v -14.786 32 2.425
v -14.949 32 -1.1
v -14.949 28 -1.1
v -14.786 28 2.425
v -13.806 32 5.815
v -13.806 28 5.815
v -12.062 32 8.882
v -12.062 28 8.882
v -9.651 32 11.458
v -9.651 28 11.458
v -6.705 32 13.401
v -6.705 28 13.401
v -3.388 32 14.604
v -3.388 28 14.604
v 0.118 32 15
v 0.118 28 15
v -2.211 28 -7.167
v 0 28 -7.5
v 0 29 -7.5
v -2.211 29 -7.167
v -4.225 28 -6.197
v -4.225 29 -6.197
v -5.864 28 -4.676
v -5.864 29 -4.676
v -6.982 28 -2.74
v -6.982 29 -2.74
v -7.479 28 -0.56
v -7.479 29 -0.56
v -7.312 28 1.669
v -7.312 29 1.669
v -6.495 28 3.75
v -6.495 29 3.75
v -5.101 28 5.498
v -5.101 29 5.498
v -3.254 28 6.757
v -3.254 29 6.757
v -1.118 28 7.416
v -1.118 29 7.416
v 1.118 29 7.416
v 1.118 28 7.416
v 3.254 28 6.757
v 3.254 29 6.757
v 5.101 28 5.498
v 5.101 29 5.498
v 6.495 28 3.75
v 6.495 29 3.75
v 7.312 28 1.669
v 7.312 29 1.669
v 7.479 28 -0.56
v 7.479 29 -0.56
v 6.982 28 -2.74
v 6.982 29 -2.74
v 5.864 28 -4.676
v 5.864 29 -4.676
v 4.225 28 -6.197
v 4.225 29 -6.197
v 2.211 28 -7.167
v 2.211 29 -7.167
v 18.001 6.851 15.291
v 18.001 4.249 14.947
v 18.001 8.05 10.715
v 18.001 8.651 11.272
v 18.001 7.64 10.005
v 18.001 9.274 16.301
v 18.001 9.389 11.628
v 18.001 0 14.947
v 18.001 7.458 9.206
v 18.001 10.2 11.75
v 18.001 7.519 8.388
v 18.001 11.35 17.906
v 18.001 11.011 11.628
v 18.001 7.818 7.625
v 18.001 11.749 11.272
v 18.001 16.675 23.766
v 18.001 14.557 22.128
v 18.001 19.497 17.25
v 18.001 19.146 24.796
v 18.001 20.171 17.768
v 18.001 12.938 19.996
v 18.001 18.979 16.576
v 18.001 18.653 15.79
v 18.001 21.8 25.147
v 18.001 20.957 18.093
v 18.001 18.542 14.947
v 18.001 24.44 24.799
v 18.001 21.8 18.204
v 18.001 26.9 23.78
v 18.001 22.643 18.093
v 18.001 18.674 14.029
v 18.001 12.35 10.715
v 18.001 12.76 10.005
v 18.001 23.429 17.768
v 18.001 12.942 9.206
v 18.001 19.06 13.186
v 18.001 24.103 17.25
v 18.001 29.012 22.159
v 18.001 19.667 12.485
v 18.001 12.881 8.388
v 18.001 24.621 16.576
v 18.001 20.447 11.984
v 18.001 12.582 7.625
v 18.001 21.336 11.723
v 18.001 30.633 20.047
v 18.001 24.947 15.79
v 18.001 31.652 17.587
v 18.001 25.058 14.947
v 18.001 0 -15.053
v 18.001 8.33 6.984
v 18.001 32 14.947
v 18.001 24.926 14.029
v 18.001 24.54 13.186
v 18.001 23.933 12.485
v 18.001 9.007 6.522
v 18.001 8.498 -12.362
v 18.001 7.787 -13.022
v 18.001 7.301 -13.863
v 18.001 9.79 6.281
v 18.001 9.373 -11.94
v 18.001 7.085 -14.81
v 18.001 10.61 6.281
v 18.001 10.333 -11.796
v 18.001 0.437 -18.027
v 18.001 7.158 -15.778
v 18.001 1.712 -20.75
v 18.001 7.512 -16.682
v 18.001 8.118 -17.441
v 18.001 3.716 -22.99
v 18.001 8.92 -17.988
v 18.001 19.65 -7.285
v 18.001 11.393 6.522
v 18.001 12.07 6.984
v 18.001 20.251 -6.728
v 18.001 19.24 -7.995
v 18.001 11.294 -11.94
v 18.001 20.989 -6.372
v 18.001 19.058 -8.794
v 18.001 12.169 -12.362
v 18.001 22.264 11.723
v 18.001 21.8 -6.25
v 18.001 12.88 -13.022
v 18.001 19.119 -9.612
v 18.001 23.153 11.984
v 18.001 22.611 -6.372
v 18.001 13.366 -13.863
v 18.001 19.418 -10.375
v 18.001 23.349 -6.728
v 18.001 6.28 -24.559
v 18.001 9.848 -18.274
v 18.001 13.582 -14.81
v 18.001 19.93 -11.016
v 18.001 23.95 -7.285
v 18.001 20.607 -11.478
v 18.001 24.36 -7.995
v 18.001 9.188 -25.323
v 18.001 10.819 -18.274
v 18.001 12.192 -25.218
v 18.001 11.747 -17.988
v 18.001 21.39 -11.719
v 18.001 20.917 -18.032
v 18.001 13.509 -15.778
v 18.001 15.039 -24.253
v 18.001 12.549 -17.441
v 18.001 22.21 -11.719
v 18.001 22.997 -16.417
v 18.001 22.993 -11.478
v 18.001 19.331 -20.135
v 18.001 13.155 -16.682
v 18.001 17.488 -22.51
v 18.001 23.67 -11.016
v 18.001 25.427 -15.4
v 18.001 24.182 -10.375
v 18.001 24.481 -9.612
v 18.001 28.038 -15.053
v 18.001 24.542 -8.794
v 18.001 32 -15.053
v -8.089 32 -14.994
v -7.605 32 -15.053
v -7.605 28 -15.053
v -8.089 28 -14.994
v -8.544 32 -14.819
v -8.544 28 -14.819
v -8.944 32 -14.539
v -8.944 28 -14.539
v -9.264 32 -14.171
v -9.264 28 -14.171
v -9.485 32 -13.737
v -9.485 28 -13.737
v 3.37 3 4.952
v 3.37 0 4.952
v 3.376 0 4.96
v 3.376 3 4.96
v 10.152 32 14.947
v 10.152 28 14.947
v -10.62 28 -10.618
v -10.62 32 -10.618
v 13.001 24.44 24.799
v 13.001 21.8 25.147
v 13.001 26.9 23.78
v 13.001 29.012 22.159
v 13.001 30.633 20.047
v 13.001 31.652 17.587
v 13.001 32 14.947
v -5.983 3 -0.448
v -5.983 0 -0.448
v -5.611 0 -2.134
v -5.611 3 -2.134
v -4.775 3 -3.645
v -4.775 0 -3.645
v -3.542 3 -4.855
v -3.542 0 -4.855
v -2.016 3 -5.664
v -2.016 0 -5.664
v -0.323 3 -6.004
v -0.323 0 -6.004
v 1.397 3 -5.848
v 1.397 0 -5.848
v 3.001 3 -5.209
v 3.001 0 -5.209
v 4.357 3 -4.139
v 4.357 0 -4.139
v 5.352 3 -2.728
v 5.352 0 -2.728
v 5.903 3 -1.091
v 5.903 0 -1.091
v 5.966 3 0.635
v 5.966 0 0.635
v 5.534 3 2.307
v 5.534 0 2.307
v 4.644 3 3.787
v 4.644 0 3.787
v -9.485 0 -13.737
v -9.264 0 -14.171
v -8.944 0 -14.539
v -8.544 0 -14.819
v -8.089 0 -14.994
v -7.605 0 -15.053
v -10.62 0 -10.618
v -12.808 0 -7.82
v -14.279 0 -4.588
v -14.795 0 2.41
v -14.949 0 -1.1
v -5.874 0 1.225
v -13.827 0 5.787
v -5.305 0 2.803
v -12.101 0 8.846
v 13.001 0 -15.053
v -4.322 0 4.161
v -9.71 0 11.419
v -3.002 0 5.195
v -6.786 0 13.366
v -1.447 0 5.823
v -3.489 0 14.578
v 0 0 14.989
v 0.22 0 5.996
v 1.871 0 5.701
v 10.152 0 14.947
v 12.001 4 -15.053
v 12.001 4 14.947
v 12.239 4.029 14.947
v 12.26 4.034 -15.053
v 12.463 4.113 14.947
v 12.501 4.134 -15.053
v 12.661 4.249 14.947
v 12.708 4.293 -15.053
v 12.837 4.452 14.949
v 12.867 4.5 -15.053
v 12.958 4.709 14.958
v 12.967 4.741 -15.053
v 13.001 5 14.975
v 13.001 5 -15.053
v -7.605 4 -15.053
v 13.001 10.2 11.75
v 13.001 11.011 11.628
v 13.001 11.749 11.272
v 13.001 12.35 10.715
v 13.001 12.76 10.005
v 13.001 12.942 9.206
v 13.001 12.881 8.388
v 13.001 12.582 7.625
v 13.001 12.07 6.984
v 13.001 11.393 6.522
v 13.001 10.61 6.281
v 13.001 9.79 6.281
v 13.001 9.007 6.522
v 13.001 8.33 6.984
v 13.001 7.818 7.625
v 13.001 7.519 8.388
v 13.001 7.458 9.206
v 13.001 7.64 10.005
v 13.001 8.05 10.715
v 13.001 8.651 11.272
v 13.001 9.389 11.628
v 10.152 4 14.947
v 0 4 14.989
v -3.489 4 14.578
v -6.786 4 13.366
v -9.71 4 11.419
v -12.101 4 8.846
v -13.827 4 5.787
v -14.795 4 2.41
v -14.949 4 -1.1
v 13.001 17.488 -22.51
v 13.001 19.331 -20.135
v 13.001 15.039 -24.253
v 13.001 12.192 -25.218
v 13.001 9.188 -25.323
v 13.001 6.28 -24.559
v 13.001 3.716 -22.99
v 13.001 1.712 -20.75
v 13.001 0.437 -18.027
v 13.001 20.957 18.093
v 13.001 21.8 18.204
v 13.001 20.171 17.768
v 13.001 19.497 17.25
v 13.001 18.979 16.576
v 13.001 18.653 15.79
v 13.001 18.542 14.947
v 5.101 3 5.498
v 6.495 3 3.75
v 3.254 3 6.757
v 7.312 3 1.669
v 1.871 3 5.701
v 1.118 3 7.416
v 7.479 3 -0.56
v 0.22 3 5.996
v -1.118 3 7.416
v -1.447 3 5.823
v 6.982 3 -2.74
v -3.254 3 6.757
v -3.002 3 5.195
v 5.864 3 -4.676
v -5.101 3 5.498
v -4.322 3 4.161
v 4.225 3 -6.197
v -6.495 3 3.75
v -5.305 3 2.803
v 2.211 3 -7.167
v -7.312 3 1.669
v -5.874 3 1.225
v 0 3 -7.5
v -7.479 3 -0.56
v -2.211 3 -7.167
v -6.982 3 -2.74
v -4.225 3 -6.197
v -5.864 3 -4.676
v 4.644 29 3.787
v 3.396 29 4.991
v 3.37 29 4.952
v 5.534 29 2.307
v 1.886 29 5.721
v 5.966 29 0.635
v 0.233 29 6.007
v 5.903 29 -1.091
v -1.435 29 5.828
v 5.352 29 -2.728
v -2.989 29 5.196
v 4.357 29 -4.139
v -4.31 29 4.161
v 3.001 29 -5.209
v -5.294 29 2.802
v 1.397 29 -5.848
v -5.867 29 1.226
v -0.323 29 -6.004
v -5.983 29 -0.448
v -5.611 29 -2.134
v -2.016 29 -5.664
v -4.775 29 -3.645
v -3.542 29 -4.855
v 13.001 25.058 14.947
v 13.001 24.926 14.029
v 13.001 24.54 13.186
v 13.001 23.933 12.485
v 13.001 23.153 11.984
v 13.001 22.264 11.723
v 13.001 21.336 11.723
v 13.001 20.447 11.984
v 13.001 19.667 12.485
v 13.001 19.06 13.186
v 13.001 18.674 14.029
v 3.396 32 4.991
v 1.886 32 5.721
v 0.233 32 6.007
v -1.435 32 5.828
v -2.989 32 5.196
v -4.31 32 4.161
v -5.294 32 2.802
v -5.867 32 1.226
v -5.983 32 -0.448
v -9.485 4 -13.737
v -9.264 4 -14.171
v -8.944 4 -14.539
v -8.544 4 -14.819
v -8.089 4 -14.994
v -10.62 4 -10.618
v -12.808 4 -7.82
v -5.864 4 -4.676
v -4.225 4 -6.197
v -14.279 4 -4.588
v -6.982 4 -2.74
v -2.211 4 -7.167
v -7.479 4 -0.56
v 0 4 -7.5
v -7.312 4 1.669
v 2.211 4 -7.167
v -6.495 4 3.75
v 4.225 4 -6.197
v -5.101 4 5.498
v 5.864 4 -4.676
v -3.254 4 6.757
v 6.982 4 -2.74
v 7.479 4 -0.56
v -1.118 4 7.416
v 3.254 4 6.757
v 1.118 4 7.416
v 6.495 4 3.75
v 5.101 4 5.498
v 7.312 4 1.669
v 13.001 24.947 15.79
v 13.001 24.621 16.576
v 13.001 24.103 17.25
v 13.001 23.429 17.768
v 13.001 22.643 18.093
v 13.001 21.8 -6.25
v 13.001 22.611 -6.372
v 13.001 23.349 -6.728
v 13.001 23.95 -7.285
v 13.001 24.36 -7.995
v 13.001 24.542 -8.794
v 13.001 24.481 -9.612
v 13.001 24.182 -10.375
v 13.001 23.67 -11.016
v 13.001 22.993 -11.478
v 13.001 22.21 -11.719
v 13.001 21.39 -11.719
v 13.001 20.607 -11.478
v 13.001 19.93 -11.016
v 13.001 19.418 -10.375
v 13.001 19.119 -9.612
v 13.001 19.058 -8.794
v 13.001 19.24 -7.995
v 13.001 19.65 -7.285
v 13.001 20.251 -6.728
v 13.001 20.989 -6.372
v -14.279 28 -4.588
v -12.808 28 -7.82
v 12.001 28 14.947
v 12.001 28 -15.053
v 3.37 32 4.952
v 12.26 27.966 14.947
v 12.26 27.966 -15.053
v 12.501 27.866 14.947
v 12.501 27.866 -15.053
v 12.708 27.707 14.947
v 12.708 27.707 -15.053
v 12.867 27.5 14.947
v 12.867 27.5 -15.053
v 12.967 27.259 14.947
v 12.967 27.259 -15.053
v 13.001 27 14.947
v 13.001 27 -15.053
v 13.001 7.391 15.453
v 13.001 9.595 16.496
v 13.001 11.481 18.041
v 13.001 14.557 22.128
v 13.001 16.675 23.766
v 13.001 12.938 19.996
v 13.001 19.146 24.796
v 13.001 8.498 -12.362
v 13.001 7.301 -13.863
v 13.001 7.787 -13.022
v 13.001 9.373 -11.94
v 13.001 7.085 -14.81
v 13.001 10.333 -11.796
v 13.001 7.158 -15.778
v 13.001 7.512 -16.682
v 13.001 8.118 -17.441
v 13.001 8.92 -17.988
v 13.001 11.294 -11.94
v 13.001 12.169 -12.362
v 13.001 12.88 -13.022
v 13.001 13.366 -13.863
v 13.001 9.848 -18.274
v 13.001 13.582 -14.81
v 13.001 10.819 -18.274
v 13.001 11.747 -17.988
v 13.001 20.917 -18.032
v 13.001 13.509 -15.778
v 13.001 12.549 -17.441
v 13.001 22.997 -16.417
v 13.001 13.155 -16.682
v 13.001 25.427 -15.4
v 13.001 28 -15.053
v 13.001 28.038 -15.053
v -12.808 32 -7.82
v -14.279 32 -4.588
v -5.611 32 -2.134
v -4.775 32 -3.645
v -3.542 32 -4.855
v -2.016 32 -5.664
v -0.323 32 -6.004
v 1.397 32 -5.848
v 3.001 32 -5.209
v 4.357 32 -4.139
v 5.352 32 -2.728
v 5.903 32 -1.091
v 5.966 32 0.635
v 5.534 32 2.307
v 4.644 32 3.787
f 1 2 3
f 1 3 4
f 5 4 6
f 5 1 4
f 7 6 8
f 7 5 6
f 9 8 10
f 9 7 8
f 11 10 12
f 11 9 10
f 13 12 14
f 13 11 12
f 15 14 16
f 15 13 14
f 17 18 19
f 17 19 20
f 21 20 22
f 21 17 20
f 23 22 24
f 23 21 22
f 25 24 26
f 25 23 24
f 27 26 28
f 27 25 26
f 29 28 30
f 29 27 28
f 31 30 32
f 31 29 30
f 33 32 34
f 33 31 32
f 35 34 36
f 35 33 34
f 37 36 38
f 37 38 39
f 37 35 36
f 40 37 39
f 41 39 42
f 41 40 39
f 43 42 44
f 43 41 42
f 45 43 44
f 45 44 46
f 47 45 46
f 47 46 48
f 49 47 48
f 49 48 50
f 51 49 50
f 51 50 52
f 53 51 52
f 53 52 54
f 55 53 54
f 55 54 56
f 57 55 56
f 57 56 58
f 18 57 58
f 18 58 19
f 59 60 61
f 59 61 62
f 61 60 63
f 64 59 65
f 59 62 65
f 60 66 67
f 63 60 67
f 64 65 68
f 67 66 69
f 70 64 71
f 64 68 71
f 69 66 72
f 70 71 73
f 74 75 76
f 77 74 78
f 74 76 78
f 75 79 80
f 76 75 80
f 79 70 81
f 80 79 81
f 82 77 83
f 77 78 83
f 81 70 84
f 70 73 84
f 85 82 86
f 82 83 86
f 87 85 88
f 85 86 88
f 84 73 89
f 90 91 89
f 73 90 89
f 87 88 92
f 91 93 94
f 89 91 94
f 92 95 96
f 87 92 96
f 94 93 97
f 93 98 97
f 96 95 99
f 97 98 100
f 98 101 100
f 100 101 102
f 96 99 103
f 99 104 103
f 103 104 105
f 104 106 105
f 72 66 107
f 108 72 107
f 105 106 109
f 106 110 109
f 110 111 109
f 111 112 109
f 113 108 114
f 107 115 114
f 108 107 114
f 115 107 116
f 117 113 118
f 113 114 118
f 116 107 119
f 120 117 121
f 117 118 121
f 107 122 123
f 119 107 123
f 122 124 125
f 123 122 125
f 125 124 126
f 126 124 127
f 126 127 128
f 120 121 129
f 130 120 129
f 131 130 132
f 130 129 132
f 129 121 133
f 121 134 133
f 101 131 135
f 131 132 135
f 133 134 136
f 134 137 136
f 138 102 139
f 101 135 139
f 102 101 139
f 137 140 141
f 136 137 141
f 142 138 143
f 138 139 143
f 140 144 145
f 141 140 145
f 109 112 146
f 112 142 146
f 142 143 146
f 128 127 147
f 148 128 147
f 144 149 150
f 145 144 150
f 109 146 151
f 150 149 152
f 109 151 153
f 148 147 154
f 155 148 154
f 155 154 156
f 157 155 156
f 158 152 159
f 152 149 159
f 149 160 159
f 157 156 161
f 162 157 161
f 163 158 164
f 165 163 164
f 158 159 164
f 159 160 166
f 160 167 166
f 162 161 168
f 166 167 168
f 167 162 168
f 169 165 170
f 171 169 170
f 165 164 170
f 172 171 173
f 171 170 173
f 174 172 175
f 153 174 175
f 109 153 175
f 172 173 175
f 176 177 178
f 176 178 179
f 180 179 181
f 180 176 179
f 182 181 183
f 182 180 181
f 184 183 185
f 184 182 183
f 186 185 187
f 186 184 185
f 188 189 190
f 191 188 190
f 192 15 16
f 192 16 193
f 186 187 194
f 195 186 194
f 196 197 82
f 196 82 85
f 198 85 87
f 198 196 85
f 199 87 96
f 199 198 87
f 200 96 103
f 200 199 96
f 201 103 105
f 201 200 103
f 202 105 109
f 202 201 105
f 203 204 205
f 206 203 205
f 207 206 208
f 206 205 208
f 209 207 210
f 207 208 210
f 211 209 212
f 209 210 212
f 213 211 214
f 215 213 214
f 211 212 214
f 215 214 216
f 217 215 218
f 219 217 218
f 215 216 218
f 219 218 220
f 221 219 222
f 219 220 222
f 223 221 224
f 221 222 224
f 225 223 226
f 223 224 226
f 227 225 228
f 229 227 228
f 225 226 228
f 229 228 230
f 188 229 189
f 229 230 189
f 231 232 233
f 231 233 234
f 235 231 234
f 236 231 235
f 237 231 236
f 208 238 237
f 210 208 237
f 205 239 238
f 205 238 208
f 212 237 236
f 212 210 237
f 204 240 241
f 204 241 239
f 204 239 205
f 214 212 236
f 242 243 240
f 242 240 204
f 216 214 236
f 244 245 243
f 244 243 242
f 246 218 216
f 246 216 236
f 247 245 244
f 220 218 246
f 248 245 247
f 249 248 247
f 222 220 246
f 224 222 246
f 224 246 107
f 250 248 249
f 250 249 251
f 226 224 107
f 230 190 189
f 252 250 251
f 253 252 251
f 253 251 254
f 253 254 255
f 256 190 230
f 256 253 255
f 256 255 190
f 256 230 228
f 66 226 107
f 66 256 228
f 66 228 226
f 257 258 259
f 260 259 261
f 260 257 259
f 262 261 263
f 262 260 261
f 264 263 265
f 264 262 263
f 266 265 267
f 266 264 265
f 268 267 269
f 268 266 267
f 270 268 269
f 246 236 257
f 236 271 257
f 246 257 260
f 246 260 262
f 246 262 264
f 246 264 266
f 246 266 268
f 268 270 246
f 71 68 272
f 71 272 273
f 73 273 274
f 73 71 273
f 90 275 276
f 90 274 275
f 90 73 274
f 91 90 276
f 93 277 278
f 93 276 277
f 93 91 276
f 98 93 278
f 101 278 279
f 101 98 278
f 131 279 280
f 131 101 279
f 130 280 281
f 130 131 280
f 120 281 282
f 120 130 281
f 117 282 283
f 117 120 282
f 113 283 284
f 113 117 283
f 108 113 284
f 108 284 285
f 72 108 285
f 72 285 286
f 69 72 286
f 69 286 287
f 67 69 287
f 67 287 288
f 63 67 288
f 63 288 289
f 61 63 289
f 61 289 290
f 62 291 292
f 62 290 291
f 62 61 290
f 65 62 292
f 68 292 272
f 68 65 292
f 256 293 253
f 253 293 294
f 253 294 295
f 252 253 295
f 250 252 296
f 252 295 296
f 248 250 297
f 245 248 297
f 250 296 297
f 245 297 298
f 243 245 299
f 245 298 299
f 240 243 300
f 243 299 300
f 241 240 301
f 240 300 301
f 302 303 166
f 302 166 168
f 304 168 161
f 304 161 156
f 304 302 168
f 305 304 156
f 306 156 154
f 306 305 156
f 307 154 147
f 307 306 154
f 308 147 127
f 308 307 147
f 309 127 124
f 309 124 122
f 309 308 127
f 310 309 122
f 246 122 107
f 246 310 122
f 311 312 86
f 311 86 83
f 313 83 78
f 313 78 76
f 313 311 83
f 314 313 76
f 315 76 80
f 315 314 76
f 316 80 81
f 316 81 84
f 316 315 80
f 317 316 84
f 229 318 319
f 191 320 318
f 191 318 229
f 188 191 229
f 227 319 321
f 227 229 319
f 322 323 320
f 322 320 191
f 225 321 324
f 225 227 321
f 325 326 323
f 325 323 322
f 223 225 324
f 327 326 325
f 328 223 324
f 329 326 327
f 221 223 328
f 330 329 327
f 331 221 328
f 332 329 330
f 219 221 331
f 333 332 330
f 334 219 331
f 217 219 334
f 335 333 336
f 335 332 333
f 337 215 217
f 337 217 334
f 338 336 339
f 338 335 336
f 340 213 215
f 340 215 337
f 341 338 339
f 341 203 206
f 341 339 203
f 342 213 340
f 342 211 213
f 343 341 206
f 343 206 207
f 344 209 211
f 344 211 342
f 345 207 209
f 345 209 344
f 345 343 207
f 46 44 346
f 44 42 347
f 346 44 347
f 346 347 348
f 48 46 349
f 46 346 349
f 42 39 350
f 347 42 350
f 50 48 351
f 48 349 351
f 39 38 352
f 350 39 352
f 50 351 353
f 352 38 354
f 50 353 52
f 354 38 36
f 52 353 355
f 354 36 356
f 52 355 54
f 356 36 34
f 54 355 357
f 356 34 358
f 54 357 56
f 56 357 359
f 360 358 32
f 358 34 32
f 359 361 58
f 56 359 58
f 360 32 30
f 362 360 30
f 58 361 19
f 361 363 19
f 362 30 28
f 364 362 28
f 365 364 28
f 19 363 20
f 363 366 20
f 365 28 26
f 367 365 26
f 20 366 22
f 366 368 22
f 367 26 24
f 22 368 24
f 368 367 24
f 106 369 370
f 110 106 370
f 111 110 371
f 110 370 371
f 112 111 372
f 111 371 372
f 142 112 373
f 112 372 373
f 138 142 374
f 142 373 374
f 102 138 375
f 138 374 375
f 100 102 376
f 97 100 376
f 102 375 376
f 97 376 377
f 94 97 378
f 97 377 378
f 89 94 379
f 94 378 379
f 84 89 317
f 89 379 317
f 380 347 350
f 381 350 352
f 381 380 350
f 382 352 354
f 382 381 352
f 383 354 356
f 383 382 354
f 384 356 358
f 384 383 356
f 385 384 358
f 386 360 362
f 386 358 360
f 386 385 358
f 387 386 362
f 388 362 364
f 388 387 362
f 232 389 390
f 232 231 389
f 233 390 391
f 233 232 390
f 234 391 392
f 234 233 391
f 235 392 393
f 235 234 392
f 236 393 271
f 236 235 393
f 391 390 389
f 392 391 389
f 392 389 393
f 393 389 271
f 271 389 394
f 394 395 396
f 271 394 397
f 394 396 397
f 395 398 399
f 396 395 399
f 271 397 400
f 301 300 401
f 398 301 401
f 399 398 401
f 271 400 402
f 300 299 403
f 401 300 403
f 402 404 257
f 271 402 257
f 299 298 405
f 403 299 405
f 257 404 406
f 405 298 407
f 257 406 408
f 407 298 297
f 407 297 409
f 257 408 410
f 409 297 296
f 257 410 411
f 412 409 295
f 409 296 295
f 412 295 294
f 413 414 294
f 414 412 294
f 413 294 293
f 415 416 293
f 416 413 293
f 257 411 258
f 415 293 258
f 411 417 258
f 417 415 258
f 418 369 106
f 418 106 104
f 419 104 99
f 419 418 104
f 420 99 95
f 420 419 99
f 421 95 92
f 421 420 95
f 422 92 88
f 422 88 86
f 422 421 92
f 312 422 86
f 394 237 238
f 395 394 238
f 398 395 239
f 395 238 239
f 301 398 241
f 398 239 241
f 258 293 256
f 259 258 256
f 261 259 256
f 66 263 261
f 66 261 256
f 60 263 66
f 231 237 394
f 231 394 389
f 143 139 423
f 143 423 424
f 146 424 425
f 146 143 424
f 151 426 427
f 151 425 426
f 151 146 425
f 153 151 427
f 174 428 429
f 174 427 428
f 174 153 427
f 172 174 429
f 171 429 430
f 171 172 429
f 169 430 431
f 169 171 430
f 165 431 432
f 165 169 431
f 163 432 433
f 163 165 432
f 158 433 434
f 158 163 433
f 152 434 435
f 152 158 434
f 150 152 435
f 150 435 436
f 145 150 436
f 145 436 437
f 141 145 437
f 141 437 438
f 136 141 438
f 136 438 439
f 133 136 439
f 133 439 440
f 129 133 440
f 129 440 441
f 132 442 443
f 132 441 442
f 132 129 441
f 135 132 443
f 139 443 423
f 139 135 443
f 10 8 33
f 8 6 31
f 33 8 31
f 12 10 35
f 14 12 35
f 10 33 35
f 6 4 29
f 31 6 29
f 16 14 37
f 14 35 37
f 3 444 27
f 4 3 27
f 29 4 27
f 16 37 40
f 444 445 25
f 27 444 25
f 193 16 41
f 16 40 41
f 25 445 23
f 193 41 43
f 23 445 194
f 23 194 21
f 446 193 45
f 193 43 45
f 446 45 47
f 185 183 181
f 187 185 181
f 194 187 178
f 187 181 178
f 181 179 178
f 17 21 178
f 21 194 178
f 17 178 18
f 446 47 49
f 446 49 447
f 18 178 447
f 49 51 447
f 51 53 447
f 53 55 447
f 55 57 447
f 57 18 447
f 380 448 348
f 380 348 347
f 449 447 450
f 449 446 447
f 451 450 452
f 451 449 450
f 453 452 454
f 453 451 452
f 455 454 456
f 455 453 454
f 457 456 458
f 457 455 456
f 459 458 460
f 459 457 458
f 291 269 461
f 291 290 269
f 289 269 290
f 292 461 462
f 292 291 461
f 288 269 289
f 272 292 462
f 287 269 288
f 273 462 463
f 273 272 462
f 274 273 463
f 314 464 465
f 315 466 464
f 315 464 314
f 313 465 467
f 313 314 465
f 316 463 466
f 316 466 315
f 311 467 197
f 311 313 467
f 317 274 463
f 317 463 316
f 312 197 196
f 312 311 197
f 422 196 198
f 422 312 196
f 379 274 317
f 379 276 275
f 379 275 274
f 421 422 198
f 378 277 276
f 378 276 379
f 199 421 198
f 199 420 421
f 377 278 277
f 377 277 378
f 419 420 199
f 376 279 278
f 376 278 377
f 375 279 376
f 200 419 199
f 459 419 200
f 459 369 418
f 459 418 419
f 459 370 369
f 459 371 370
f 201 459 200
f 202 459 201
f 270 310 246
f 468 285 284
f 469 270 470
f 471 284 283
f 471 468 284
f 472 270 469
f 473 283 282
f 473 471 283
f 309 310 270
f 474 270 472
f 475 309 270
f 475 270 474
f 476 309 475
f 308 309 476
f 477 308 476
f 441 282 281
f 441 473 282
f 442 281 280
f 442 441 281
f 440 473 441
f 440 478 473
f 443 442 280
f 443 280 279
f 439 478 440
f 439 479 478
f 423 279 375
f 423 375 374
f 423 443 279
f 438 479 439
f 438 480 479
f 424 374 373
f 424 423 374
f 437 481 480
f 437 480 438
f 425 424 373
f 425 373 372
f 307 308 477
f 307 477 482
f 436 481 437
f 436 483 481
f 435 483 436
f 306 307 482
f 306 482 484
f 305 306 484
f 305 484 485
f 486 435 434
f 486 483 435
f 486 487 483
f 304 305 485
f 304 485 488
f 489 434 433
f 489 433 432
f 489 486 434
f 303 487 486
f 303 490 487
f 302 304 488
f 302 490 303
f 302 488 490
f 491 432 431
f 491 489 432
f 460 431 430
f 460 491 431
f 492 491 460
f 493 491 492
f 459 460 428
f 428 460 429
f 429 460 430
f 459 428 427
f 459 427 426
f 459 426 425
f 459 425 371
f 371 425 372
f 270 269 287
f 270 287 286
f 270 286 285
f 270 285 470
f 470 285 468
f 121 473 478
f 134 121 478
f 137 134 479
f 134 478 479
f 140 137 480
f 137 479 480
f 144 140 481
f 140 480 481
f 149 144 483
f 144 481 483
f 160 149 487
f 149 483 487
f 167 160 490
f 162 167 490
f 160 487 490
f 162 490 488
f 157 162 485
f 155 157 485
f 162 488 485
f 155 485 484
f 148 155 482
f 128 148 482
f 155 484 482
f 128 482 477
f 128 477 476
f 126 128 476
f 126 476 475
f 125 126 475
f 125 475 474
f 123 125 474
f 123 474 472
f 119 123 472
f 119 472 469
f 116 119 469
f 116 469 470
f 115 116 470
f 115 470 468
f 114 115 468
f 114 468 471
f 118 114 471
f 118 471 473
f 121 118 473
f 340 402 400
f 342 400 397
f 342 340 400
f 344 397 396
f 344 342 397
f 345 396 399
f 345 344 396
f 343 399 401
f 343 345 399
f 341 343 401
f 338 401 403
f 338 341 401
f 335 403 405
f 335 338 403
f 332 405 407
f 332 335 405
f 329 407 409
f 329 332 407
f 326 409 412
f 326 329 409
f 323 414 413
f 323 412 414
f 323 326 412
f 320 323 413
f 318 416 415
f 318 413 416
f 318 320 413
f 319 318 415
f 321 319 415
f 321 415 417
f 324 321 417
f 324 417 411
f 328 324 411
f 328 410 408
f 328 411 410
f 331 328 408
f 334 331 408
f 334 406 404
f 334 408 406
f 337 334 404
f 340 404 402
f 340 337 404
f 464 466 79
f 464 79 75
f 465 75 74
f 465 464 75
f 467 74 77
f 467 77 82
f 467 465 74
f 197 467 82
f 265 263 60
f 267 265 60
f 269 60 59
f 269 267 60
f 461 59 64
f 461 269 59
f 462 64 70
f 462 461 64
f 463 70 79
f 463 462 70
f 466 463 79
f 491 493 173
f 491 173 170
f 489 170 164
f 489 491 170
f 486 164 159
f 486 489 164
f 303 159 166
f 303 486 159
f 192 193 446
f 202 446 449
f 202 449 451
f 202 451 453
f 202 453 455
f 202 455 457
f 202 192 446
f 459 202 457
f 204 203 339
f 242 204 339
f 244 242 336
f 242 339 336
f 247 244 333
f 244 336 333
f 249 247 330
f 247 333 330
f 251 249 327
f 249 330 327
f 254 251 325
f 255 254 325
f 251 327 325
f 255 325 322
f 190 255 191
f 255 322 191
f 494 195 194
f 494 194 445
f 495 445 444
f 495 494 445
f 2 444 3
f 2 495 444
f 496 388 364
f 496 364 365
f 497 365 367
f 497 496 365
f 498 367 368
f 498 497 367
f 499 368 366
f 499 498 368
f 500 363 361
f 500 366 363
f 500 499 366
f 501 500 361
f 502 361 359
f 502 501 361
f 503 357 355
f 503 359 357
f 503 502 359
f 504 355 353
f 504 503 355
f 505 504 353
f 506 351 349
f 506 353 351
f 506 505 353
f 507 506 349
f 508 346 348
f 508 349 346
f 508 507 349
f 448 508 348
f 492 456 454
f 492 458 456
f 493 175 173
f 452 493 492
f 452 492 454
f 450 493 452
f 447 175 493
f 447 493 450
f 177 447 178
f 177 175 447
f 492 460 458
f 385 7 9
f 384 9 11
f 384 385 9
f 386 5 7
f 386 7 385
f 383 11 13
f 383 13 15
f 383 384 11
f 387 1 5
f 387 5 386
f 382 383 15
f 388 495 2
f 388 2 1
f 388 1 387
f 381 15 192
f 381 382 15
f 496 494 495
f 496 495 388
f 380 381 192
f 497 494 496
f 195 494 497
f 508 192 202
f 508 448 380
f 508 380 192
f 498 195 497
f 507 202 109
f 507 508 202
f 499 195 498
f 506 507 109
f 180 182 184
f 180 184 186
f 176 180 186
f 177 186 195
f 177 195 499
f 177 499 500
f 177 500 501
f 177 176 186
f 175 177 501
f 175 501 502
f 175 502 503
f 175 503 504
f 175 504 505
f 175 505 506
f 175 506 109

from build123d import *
from build123d.topology import SkipClean

# Parameters (mm, degrees)
BOSS_EXTRUDE1_DEPTH     = 4
SKETCH3_W               = 5
SKETCH3_H               = 30
BOSS_EXTRUDE3_DEPTH     = 24
BOSS_EXTRUDE5_DEPTH     = 5
SKETCH7_3_R             = 3.25755
CUT_EXTRUDE3_DEPTH      = 5
FILLET3_R               = 10
BOSS_EXTRUDE8_START     = -4
BOSS_EXTRUDE8_DEPTH     = 4
BOSS_EXTRUDE9_DEPTH     = 4
CUT_EXTRUDE4_DEPTH      = 25
CUT_EXTRUDE4_DEPTH_BACK = 1
SKETCH8_R               = 7.5
CUT_EXTRUDE5_DEPTH      = 50.517048882
CUT_EXTRUDE5_DEPTH_BACK = 50.517048882
SKETCH9_R               = 2.75
FILLET4_R               = 1
BOSS_EXTRUDE6_START     = -4
BOSS_EXTRUDE6_DEPTH     = 4
FILLET6_R               = 2
BOSS_EXTRUDE7_DEPTH     = 4


# Read off the part's stored shape, not the designer's step: Boss-Extrude8
with BuildPart() as part:
    # Sketch2 → Boss-Extrude1 (new body)
    with BuildSketch(Plane(origin=(0, 0, 0), x_dir=(1, 0, 0), z_dir=(0, 1, 0))):
        with BuildLine():
            Line((18.000912404, -14.946929254), (18.000912404, 15.053070746))
            Line((18.000912404, 15.053070746), (0.039090451, 15.053070746))
            ThreePointArc((0.039090451, 15.053070746), (-10.199781301, 11.024824414), (-14.94907539, 1.099832277))
            Line((-14.94907539, 1.099832277), (-5.983249792, 0.448020006))
            ThreePointArc((-5.983249792, 0.448020006), (3.000957071, 5.20912276), (3.369824569, -4.951979994))
            Line((3.369824569, -4.951979994), (10.151696986, -14.946929254))
            Line((10.151696986, -14.946929254), (18.000912404, -14.946929254))
        make_face()
    boss_extrude1 = extrude(amount=BOSS_EXTRUDE1_DEPTH)

    # Sketch3 → Boss-Extrude3 (add)
    with BuildSketch(Plane(origin=(0, 4, 0), x_dir=(1, 0, 0), z_dir=(0, 1, 0))):
        with Locations((15.500912404, 0.053070746)):
            Rectangle(SKETCH3_W, SKETCH3_H)
    extrude(amount=BOSS_EXTRUDE3_DEPTH)

    # Mirror1: Boss-Extrude1 across plane
    add(boss_extrude1.mirror(Plane.ZX.offset(16)))

    # Sketch7 → Boss-Extrude5 (add)
    with BuildSketch(Plane.ZY.offset(-13.000912404)):
        with BuildLine():
            Line((-15.053070746, 0), (-15.053070746, 4))
            Line((-15.053070746, 4), (-15.053070746, 7.075913265))
            ThreePointArc((-15.053070746, 7.075913265), (-18.310620746, 10.333463265), (-15.053070746, 13.591013265))
            Line((-15.053070746, 13.591013265), (-15.053070746, 20.666926531))
            ThreePointArc((-15.053070746, 20.666926531), (-25.386534011, 10.333463265), (-15.053070746, 0))
        make_face()
        with BuildLine():
            ThreePointArc((25.146929254, 21.8), (22.159418422, 29.012489168), (14.946929254, 32))
            Line((14.946929254, 32), (14.946929254, 28))
            Line((14.946929254, 28), (14.946929254, 25.05755))
            ThreePointArc((14.946929254, 25.05755), (17.250364949, 24.103435695), (18.204479254, 21.8))
            ThreePointArc((18.204479254, 21.8), (17.250364949, 19.496564305), (14.946929254, 18.54245))
            Line((14.946929254, 18.54245), (14.946929254, 11.6))
            ThreePointArc((14.946929254, 11.6), (22.159418422, 14.587510832), (25.146929254, 21.8))
        make_face()
        with BuildLine():
            Line((14.946929254, 28), (14.946929254, 32))
            ThreePointArc((14.946929254, 32), (4.746929254, 21.8), (14.946929254, 11.6))
            Line((14.946929254, 11.6), (14.946929254, 18.54245))
            ThreePointArc((14.946929254, 18.54245), (11.689379254, 21.8), (14.946929254, 25.05755))
            Line((14.946929254, 25.05755), (14.946929254, 28))
        make_face()
    extrude(amount=-BOSS_EXTRUDE5_DEPTH)

    # Sketch7<3> → Cut-Extrude3 (cut)
    with SkipClean():  # the faces are left unmerged after this step: merging them gives an invalid solid
        with BuildSketch(Plane.ZY.offset(-13.000912404)):
            with Locations((14.946929254, 21.8)):
                Circle(SKETCH7_3_R)
            with Locations((-15.053070746, 10.333463265)):
                Circle(SKETCH7_3_R)
        extrude(amount=-CUT_EXTRUDE3_DEPTH, mode=Mode.SUBTRACT)

    # Fillet3
    # the kernel refuses this fillet: 10 mm, written as the material it adds along each edge
    with BuildSketch(Plane(origin=(13.000912404, 20.666926531, -15.053070746), x_dir=(0, -0.25425566101904284, -0.9671370424297528), z_dir=(1, 0, 0))) as fillet3_piece_1:
        with BuildLine():
            CenterArc((7.797239676, 9.671370424), FILLET3_R, 194.729484057, 60.541031886)
            Line((-1.874130748, 7.128813814), (0, 0))
            ThreePointArc((0, 0), (2.627341533, 0.339588165), (5.254683066, 0))
        make_face()
    extrude(amount=5)
    with BuildSketch(Plane(origin=(13.000912404, 11.6, 14.946929254), x_dir=(0, -1, 0), z_dir=(1, 0, 0))) as fillet3_piece_2:
        with BuildLine():
            CenterArc((7.351068344, -10), FILLET3_R, 90, 60.326985198)
            ThreePointArc((-1.337579351, -5.04950495), (-0.340063626, -2.611829759), (0, 0))
            Line((0, 0), (7.351068344, 0))
        make_face()
    extrude(amount=5)

    # Boss-Extrude8 outline → Boss-Extrude8 (add)
    with SkipClean():  # the faces are left unmerged after this step: merging them gives an invalid solid
        with BuildSketch(Plane.XZ.offset(BOSS_EXTRUDE8_START)):
            with BuildLine():
                ThreePointArc((-5.983249792, -0.448020006), (-3.002134964, 5.194919216), (3.375546051, 4.960412166))
                Line((3.375546051, 4.960412166), (10.151696986, 14.946929254))
                Line((10.151696986, 14.946929254), (0, 14.989479178))
                ThreePointArc((0, 14.989479178), (-10.981129247, 10.202905787), (-14.94907539, -1.099832277))
                Line((-14.94907539, -1.099832277), (-5.983249792, -0.448020006))
            make_face()
        extrude(amount=BOSS_EXTRUDE8_DEPTH)

    # Sketch13 → Boss-Extrude9 (add)
    with SkipClean():  # the faces are left unmerged after this step: merging them gives an invalid solid
        with BuildSketch(Plane(origin=(0, 32, 0), x_dir=(1, 0, 0), z_dir=(0, 1, 0))):
            with BuildLine():
                Line((10.151696986, -14.946929254), (8.443727077, -12.429767101))
                ThreePointArc((8.443727077, -12.429767101), (4.471376939, -14.331468239), (0.118292185, -14.999813933))
                Line((0.118292185, -14.999813933), (10.151696986, -14.946929254))
            make_face()
            with BuildLine():
                ThreePointArc((6.07616266, 0.026524042), (5.364215569, -2.817642503), (3.396292996, -4.990988482))
                Line((3.396292996, -4.990988482), (8.443727077, -12.429767101))
                ThreePointArc((8.443727077, -12.429767101), (13.307281184, -7.027001355), (15.065637155, 0.026524042))
                ThreePointArc((15.065637155, 0.026524042), (10.664463523, 10.651897114), (0.039090451, 15.053070746))
                ThreePointArc((0.039090451, 15.053070746), (-10.199781301, 11.024824414), (-14.94907539, 1.099832277))
                Line((-14.94907539, 1.099832277), (-5.983249792, 0.448020006))
                ThreePointArc((-5.983249792, 0.448020006), (0.249967121, 6.059912135), (6.07616266, 0.026524042))
            make_face()
            with BuildLine():
                Line((8.443727077, -12.429767101), (3.396292996, -4.990988482))
                ThreePointArc((3.396292996, -4.990988482), (-2.989348597, -5.196003869), (-5.983249792, 0.448020006))
                Line((-5.983249792, 0.448020006), (-14.94907539, 1.099832277))
                ThreePointArc((-14.94907539, 1.099832277), (-10.932188175, -10.241297106), (0.118292185, -14.999813933))
                ThreePointArc((0.118292185, -14.999813933), (4.471376939, -14.331468239), (8.443727077, -12.429767101))
            make_face()
        extrude(amount=-BOSS_EXTRUDE9_DEPTH)

    # Sketch8 → Cut-Extrude4 (cut, two sides: drawn at the far end of the back side and taken through both)
    with SkipClean():  # the faces are left unmerged after this step: merging them gives an invalid solid
        with BuildSketch(Plane(origin=(0, 4, 0), x_dir=(1, 0, 0), z_dir=(0, 1, 0)).offset(-CUT_EXTRUDE4_DEPTH_BACK)):
            with Locations(Location((0, 0, 0), (0, 0, 90))):
                Circle(SKETCH8_R)
        extrude(amount=CUT_EXTRUDE4_DEPTH + CUT_EXTRUDE4_DEPTH_BACK, mode=Mode.SUBTRACT)

    # Sketch9 → Cut-Extrude5 (cut, two sides: drawn at the far end of the back side and taken through both)
    with BuildSketch(Plane.ZY.offset(-13.000912404).offset(-CUT_EXTRUDE5_DEPTH_BACK)):
        with Locations((9, 10.2)):
            Circle(SKETCH9_R)
        with Locations((-9, 21.8)):
            Circle(SKETCH9_R)
    extrude(amount=CUT_EXTRUDE5_DEPTH + CUT_EXTRUDE5_DEPTH_BACK, mode=Mode.SUBTRACT)

    # Fillet4
    fillet4_edges = [part.edges().sort_by_distance(p)[0] for p in [
        (13.000912404, 4, -0.053070746),
        (13.000912404, 28, -0.053070746),
    ]]
    fillet(fillet4_edges, radius=FILLET4_R)

    # Sketch10 → Boss-Extrude6 (add)
    with BuildSketch(Plane.XZ.offset(BOSS_EXTRUDE6_START)):
        with BuildLine():
            ThreePointArc((0.039090451, -15.053070746), (-5.733491903, -13.900038334), (-10.620178824, -10.617892431))
            Line((-10.620178824, -10.617892431), (-9.005905934, -15.053070746))
            Line((-9.005905934, -15.053070746), (0.039090451, -15.053070746))
        make_face()
    extrude(amount=BOSS_EXTRUDE6_DEPTH)

    # Fillet6
    fillet6_edges = [part.edges().sort_by_distance(p)[0] for p in [
        (-9.005905934, 2, -15.053070746),
    ]]
    fillet(fillet6_edges, radius=FILLET6_R)

    # Sketch11 → Boss-Extrude7 (add)
    with BuildSketch(Plane(origin=(0, 32, 0), x_dir=(1, 0, 0), z_dir=(0, 1, 0))):
        with BuildLine():
            Line((-9.484876099, 13.737111032), (-10.620178824, 10.617892431))
            ThreePointArc((-10.620178824, 10.617892431), (-5.733491903, 13.900038334), (0.039090451, 15.053070746))
            Line((0.039090451, 15.053070746), (-7.605490857, 15.053070746))
            ThreePointArc((-7.605490857, 15.053070746), (-8.75264373, 14.691374834), (-9.484876099, 13.737111032))
        make_face()
    extrude(amount=-BOSS_EXTRUDE7_DEPTH)


solid = part.part
